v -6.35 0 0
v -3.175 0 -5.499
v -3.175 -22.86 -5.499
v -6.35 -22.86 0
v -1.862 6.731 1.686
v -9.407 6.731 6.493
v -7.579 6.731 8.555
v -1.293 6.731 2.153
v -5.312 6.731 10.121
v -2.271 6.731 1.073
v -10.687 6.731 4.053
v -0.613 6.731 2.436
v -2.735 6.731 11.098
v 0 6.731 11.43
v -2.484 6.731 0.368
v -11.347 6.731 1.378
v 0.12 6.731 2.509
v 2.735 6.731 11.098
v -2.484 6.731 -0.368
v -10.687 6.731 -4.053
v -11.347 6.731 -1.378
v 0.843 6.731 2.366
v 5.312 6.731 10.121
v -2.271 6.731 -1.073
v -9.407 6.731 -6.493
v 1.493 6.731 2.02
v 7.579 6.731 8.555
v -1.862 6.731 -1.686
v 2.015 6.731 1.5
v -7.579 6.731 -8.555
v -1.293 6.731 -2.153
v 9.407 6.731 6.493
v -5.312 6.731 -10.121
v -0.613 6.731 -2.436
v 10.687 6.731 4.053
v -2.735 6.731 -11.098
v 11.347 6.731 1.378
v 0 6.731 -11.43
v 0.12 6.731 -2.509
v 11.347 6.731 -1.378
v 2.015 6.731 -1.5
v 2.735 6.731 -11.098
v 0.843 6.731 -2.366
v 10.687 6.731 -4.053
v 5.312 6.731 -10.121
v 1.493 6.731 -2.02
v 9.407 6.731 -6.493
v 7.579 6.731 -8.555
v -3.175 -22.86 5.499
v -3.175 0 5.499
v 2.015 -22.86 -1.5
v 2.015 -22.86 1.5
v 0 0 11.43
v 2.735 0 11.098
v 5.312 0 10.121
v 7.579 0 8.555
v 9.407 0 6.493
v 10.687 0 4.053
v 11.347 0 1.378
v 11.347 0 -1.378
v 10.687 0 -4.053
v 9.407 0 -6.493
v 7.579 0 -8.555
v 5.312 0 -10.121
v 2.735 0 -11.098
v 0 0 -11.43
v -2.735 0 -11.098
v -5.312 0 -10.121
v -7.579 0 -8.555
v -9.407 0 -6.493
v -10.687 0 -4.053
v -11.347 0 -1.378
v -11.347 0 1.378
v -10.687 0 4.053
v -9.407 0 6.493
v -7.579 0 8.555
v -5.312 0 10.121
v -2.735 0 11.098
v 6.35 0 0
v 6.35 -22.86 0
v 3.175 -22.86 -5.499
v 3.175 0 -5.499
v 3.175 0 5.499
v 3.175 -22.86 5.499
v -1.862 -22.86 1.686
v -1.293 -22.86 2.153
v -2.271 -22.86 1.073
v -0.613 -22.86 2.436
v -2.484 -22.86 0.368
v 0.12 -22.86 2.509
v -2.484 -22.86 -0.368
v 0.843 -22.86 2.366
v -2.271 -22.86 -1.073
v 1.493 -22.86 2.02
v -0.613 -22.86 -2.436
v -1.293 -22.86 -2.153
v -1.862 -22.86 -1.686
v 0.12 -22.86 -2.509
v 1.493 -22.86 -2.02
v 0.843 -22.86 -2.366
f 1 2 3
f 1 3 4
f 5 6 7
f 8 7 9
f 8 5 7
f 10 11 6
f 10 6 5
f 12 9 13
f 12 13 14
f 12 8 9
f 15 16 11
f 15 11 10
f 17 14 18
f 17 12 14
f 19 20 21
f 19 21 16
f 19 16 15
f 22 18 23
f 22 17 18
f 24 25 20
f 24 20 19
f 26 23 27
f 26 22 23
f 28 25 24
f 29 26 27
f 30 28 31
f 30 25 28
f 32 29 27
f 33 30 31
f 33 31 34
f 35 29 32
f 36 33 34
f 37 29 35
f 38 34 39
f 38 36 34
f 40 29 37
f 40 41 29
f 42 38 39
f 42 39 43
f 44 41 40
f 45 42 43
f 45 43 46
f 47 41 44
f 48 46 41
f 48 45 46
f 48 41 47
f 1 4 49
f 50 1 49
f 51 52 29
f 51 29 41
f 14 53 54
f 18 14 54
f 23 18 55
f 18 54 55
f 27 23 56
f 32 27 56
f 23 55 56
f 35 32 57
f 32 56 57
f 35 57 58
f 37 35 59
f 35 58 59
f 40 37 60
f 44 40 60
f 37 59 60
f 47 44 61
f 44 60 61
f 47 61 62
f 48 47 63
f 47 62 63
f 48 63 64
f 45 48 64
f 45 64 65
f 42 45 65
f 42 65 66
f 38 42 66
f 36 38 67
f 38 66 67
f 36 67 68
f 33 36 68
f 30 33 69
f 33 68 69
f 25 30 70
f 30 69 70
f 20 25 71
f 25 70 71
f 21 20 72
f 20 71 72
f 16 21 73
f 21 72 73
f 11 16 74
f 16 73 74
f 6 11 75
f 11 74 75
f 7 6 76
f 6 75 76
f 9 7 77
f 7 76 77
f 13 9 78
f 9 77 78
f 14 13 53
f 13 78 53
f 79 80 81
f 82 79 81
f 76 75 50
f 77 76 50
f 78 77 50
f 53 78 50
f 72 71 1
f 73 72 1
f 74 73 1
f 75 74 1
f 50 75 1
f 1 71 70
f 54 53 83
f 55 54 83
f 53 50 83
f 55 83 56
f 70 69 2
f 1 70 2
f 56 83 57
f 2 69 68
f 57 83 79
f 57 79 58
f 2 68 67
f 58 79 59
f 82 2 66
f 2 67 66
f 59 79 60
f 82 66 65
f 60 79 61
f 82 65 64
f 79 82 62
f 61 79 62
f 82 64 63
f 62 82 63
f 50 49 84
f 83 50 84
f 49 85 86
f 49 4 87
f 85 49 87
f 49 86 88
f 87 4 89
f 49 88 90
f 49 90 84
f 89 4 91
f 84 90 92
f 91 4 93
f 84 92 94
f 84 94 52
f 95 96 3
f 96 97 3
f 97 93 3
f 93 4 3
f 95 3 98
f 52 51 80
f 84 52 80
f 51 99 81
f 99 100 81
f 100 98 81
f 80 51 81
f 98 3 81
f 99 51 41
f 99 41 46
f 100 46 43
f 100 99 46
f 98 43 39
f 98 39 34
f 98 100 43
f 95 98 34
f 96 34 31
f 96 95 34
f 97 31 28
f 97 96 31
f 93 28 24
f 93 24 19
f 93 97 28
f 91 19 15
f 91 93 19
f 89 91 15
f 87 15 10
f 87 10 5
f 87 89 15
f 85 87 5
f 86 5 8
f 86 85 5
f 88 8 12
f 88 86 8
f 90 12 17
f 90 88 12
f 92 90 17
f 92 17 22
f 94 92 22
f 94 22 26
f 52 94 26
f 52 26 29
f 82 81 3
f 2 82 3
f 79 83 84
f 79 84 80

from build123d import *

# Parameters (mm, degrees)
SKETCH1_R           = 11.43
BOSS_EXTRUDE1_DEPTH = 6.731
BOSS_EXTRUDE2_START = -22.86
BOSS_EXTRUDE2_DEPTH = 22.86


with BuildPart() as part:
    # Sketch1 → Boss-Extrude1 (new body)
    with BuildSketch(Plane(origin=(0, 0, 0), x_dir=(1, 0, 0), z_dir=(0, 1, 0))):
        Circle(SKETCH1_R)
        with BuildLine():
            Line((2.014584776, 1.499860387), (2.014584776, -1.499860387))
            ThreePointArc((2.014584776, -1.499860387), (-2.51159969, 0), (2.014584776, 1.499860387))
        make_face(mode=Mode.SUBTRACT)
    extrude(amount=BOSS_EXTRUDE1_DEPTH)

    # Sketch1<3> → Boss-Extrude2 (add)
    with BuildSketch(Plane(origin=(0, 0, 0), x_dir=(1, 0, 0), z_dir=(0, 1, 0)).offset(BOSS_EXTRUDE2_START)):
        Polygon((-6.35, 0), (-3.175, -5.499261314), (3.175, -5.499261314), (6.35, 0), (3.175, 5.499261314), (-3.175, 5.499261314), align=None)
        with BuildLine():
            Line((2.014584776, 1.499860387), (2.014584776, -1.499860387))
            ThreePointArc((2.014584776, -1.499860387), (-2.51159969, 0), (2.014584776, 1.499860387))
        make_face(mode=Mode.SUBTRACT)
    extrude(amount=BOSS_EXTRUDE2_DEPTH)


solid = part.part
